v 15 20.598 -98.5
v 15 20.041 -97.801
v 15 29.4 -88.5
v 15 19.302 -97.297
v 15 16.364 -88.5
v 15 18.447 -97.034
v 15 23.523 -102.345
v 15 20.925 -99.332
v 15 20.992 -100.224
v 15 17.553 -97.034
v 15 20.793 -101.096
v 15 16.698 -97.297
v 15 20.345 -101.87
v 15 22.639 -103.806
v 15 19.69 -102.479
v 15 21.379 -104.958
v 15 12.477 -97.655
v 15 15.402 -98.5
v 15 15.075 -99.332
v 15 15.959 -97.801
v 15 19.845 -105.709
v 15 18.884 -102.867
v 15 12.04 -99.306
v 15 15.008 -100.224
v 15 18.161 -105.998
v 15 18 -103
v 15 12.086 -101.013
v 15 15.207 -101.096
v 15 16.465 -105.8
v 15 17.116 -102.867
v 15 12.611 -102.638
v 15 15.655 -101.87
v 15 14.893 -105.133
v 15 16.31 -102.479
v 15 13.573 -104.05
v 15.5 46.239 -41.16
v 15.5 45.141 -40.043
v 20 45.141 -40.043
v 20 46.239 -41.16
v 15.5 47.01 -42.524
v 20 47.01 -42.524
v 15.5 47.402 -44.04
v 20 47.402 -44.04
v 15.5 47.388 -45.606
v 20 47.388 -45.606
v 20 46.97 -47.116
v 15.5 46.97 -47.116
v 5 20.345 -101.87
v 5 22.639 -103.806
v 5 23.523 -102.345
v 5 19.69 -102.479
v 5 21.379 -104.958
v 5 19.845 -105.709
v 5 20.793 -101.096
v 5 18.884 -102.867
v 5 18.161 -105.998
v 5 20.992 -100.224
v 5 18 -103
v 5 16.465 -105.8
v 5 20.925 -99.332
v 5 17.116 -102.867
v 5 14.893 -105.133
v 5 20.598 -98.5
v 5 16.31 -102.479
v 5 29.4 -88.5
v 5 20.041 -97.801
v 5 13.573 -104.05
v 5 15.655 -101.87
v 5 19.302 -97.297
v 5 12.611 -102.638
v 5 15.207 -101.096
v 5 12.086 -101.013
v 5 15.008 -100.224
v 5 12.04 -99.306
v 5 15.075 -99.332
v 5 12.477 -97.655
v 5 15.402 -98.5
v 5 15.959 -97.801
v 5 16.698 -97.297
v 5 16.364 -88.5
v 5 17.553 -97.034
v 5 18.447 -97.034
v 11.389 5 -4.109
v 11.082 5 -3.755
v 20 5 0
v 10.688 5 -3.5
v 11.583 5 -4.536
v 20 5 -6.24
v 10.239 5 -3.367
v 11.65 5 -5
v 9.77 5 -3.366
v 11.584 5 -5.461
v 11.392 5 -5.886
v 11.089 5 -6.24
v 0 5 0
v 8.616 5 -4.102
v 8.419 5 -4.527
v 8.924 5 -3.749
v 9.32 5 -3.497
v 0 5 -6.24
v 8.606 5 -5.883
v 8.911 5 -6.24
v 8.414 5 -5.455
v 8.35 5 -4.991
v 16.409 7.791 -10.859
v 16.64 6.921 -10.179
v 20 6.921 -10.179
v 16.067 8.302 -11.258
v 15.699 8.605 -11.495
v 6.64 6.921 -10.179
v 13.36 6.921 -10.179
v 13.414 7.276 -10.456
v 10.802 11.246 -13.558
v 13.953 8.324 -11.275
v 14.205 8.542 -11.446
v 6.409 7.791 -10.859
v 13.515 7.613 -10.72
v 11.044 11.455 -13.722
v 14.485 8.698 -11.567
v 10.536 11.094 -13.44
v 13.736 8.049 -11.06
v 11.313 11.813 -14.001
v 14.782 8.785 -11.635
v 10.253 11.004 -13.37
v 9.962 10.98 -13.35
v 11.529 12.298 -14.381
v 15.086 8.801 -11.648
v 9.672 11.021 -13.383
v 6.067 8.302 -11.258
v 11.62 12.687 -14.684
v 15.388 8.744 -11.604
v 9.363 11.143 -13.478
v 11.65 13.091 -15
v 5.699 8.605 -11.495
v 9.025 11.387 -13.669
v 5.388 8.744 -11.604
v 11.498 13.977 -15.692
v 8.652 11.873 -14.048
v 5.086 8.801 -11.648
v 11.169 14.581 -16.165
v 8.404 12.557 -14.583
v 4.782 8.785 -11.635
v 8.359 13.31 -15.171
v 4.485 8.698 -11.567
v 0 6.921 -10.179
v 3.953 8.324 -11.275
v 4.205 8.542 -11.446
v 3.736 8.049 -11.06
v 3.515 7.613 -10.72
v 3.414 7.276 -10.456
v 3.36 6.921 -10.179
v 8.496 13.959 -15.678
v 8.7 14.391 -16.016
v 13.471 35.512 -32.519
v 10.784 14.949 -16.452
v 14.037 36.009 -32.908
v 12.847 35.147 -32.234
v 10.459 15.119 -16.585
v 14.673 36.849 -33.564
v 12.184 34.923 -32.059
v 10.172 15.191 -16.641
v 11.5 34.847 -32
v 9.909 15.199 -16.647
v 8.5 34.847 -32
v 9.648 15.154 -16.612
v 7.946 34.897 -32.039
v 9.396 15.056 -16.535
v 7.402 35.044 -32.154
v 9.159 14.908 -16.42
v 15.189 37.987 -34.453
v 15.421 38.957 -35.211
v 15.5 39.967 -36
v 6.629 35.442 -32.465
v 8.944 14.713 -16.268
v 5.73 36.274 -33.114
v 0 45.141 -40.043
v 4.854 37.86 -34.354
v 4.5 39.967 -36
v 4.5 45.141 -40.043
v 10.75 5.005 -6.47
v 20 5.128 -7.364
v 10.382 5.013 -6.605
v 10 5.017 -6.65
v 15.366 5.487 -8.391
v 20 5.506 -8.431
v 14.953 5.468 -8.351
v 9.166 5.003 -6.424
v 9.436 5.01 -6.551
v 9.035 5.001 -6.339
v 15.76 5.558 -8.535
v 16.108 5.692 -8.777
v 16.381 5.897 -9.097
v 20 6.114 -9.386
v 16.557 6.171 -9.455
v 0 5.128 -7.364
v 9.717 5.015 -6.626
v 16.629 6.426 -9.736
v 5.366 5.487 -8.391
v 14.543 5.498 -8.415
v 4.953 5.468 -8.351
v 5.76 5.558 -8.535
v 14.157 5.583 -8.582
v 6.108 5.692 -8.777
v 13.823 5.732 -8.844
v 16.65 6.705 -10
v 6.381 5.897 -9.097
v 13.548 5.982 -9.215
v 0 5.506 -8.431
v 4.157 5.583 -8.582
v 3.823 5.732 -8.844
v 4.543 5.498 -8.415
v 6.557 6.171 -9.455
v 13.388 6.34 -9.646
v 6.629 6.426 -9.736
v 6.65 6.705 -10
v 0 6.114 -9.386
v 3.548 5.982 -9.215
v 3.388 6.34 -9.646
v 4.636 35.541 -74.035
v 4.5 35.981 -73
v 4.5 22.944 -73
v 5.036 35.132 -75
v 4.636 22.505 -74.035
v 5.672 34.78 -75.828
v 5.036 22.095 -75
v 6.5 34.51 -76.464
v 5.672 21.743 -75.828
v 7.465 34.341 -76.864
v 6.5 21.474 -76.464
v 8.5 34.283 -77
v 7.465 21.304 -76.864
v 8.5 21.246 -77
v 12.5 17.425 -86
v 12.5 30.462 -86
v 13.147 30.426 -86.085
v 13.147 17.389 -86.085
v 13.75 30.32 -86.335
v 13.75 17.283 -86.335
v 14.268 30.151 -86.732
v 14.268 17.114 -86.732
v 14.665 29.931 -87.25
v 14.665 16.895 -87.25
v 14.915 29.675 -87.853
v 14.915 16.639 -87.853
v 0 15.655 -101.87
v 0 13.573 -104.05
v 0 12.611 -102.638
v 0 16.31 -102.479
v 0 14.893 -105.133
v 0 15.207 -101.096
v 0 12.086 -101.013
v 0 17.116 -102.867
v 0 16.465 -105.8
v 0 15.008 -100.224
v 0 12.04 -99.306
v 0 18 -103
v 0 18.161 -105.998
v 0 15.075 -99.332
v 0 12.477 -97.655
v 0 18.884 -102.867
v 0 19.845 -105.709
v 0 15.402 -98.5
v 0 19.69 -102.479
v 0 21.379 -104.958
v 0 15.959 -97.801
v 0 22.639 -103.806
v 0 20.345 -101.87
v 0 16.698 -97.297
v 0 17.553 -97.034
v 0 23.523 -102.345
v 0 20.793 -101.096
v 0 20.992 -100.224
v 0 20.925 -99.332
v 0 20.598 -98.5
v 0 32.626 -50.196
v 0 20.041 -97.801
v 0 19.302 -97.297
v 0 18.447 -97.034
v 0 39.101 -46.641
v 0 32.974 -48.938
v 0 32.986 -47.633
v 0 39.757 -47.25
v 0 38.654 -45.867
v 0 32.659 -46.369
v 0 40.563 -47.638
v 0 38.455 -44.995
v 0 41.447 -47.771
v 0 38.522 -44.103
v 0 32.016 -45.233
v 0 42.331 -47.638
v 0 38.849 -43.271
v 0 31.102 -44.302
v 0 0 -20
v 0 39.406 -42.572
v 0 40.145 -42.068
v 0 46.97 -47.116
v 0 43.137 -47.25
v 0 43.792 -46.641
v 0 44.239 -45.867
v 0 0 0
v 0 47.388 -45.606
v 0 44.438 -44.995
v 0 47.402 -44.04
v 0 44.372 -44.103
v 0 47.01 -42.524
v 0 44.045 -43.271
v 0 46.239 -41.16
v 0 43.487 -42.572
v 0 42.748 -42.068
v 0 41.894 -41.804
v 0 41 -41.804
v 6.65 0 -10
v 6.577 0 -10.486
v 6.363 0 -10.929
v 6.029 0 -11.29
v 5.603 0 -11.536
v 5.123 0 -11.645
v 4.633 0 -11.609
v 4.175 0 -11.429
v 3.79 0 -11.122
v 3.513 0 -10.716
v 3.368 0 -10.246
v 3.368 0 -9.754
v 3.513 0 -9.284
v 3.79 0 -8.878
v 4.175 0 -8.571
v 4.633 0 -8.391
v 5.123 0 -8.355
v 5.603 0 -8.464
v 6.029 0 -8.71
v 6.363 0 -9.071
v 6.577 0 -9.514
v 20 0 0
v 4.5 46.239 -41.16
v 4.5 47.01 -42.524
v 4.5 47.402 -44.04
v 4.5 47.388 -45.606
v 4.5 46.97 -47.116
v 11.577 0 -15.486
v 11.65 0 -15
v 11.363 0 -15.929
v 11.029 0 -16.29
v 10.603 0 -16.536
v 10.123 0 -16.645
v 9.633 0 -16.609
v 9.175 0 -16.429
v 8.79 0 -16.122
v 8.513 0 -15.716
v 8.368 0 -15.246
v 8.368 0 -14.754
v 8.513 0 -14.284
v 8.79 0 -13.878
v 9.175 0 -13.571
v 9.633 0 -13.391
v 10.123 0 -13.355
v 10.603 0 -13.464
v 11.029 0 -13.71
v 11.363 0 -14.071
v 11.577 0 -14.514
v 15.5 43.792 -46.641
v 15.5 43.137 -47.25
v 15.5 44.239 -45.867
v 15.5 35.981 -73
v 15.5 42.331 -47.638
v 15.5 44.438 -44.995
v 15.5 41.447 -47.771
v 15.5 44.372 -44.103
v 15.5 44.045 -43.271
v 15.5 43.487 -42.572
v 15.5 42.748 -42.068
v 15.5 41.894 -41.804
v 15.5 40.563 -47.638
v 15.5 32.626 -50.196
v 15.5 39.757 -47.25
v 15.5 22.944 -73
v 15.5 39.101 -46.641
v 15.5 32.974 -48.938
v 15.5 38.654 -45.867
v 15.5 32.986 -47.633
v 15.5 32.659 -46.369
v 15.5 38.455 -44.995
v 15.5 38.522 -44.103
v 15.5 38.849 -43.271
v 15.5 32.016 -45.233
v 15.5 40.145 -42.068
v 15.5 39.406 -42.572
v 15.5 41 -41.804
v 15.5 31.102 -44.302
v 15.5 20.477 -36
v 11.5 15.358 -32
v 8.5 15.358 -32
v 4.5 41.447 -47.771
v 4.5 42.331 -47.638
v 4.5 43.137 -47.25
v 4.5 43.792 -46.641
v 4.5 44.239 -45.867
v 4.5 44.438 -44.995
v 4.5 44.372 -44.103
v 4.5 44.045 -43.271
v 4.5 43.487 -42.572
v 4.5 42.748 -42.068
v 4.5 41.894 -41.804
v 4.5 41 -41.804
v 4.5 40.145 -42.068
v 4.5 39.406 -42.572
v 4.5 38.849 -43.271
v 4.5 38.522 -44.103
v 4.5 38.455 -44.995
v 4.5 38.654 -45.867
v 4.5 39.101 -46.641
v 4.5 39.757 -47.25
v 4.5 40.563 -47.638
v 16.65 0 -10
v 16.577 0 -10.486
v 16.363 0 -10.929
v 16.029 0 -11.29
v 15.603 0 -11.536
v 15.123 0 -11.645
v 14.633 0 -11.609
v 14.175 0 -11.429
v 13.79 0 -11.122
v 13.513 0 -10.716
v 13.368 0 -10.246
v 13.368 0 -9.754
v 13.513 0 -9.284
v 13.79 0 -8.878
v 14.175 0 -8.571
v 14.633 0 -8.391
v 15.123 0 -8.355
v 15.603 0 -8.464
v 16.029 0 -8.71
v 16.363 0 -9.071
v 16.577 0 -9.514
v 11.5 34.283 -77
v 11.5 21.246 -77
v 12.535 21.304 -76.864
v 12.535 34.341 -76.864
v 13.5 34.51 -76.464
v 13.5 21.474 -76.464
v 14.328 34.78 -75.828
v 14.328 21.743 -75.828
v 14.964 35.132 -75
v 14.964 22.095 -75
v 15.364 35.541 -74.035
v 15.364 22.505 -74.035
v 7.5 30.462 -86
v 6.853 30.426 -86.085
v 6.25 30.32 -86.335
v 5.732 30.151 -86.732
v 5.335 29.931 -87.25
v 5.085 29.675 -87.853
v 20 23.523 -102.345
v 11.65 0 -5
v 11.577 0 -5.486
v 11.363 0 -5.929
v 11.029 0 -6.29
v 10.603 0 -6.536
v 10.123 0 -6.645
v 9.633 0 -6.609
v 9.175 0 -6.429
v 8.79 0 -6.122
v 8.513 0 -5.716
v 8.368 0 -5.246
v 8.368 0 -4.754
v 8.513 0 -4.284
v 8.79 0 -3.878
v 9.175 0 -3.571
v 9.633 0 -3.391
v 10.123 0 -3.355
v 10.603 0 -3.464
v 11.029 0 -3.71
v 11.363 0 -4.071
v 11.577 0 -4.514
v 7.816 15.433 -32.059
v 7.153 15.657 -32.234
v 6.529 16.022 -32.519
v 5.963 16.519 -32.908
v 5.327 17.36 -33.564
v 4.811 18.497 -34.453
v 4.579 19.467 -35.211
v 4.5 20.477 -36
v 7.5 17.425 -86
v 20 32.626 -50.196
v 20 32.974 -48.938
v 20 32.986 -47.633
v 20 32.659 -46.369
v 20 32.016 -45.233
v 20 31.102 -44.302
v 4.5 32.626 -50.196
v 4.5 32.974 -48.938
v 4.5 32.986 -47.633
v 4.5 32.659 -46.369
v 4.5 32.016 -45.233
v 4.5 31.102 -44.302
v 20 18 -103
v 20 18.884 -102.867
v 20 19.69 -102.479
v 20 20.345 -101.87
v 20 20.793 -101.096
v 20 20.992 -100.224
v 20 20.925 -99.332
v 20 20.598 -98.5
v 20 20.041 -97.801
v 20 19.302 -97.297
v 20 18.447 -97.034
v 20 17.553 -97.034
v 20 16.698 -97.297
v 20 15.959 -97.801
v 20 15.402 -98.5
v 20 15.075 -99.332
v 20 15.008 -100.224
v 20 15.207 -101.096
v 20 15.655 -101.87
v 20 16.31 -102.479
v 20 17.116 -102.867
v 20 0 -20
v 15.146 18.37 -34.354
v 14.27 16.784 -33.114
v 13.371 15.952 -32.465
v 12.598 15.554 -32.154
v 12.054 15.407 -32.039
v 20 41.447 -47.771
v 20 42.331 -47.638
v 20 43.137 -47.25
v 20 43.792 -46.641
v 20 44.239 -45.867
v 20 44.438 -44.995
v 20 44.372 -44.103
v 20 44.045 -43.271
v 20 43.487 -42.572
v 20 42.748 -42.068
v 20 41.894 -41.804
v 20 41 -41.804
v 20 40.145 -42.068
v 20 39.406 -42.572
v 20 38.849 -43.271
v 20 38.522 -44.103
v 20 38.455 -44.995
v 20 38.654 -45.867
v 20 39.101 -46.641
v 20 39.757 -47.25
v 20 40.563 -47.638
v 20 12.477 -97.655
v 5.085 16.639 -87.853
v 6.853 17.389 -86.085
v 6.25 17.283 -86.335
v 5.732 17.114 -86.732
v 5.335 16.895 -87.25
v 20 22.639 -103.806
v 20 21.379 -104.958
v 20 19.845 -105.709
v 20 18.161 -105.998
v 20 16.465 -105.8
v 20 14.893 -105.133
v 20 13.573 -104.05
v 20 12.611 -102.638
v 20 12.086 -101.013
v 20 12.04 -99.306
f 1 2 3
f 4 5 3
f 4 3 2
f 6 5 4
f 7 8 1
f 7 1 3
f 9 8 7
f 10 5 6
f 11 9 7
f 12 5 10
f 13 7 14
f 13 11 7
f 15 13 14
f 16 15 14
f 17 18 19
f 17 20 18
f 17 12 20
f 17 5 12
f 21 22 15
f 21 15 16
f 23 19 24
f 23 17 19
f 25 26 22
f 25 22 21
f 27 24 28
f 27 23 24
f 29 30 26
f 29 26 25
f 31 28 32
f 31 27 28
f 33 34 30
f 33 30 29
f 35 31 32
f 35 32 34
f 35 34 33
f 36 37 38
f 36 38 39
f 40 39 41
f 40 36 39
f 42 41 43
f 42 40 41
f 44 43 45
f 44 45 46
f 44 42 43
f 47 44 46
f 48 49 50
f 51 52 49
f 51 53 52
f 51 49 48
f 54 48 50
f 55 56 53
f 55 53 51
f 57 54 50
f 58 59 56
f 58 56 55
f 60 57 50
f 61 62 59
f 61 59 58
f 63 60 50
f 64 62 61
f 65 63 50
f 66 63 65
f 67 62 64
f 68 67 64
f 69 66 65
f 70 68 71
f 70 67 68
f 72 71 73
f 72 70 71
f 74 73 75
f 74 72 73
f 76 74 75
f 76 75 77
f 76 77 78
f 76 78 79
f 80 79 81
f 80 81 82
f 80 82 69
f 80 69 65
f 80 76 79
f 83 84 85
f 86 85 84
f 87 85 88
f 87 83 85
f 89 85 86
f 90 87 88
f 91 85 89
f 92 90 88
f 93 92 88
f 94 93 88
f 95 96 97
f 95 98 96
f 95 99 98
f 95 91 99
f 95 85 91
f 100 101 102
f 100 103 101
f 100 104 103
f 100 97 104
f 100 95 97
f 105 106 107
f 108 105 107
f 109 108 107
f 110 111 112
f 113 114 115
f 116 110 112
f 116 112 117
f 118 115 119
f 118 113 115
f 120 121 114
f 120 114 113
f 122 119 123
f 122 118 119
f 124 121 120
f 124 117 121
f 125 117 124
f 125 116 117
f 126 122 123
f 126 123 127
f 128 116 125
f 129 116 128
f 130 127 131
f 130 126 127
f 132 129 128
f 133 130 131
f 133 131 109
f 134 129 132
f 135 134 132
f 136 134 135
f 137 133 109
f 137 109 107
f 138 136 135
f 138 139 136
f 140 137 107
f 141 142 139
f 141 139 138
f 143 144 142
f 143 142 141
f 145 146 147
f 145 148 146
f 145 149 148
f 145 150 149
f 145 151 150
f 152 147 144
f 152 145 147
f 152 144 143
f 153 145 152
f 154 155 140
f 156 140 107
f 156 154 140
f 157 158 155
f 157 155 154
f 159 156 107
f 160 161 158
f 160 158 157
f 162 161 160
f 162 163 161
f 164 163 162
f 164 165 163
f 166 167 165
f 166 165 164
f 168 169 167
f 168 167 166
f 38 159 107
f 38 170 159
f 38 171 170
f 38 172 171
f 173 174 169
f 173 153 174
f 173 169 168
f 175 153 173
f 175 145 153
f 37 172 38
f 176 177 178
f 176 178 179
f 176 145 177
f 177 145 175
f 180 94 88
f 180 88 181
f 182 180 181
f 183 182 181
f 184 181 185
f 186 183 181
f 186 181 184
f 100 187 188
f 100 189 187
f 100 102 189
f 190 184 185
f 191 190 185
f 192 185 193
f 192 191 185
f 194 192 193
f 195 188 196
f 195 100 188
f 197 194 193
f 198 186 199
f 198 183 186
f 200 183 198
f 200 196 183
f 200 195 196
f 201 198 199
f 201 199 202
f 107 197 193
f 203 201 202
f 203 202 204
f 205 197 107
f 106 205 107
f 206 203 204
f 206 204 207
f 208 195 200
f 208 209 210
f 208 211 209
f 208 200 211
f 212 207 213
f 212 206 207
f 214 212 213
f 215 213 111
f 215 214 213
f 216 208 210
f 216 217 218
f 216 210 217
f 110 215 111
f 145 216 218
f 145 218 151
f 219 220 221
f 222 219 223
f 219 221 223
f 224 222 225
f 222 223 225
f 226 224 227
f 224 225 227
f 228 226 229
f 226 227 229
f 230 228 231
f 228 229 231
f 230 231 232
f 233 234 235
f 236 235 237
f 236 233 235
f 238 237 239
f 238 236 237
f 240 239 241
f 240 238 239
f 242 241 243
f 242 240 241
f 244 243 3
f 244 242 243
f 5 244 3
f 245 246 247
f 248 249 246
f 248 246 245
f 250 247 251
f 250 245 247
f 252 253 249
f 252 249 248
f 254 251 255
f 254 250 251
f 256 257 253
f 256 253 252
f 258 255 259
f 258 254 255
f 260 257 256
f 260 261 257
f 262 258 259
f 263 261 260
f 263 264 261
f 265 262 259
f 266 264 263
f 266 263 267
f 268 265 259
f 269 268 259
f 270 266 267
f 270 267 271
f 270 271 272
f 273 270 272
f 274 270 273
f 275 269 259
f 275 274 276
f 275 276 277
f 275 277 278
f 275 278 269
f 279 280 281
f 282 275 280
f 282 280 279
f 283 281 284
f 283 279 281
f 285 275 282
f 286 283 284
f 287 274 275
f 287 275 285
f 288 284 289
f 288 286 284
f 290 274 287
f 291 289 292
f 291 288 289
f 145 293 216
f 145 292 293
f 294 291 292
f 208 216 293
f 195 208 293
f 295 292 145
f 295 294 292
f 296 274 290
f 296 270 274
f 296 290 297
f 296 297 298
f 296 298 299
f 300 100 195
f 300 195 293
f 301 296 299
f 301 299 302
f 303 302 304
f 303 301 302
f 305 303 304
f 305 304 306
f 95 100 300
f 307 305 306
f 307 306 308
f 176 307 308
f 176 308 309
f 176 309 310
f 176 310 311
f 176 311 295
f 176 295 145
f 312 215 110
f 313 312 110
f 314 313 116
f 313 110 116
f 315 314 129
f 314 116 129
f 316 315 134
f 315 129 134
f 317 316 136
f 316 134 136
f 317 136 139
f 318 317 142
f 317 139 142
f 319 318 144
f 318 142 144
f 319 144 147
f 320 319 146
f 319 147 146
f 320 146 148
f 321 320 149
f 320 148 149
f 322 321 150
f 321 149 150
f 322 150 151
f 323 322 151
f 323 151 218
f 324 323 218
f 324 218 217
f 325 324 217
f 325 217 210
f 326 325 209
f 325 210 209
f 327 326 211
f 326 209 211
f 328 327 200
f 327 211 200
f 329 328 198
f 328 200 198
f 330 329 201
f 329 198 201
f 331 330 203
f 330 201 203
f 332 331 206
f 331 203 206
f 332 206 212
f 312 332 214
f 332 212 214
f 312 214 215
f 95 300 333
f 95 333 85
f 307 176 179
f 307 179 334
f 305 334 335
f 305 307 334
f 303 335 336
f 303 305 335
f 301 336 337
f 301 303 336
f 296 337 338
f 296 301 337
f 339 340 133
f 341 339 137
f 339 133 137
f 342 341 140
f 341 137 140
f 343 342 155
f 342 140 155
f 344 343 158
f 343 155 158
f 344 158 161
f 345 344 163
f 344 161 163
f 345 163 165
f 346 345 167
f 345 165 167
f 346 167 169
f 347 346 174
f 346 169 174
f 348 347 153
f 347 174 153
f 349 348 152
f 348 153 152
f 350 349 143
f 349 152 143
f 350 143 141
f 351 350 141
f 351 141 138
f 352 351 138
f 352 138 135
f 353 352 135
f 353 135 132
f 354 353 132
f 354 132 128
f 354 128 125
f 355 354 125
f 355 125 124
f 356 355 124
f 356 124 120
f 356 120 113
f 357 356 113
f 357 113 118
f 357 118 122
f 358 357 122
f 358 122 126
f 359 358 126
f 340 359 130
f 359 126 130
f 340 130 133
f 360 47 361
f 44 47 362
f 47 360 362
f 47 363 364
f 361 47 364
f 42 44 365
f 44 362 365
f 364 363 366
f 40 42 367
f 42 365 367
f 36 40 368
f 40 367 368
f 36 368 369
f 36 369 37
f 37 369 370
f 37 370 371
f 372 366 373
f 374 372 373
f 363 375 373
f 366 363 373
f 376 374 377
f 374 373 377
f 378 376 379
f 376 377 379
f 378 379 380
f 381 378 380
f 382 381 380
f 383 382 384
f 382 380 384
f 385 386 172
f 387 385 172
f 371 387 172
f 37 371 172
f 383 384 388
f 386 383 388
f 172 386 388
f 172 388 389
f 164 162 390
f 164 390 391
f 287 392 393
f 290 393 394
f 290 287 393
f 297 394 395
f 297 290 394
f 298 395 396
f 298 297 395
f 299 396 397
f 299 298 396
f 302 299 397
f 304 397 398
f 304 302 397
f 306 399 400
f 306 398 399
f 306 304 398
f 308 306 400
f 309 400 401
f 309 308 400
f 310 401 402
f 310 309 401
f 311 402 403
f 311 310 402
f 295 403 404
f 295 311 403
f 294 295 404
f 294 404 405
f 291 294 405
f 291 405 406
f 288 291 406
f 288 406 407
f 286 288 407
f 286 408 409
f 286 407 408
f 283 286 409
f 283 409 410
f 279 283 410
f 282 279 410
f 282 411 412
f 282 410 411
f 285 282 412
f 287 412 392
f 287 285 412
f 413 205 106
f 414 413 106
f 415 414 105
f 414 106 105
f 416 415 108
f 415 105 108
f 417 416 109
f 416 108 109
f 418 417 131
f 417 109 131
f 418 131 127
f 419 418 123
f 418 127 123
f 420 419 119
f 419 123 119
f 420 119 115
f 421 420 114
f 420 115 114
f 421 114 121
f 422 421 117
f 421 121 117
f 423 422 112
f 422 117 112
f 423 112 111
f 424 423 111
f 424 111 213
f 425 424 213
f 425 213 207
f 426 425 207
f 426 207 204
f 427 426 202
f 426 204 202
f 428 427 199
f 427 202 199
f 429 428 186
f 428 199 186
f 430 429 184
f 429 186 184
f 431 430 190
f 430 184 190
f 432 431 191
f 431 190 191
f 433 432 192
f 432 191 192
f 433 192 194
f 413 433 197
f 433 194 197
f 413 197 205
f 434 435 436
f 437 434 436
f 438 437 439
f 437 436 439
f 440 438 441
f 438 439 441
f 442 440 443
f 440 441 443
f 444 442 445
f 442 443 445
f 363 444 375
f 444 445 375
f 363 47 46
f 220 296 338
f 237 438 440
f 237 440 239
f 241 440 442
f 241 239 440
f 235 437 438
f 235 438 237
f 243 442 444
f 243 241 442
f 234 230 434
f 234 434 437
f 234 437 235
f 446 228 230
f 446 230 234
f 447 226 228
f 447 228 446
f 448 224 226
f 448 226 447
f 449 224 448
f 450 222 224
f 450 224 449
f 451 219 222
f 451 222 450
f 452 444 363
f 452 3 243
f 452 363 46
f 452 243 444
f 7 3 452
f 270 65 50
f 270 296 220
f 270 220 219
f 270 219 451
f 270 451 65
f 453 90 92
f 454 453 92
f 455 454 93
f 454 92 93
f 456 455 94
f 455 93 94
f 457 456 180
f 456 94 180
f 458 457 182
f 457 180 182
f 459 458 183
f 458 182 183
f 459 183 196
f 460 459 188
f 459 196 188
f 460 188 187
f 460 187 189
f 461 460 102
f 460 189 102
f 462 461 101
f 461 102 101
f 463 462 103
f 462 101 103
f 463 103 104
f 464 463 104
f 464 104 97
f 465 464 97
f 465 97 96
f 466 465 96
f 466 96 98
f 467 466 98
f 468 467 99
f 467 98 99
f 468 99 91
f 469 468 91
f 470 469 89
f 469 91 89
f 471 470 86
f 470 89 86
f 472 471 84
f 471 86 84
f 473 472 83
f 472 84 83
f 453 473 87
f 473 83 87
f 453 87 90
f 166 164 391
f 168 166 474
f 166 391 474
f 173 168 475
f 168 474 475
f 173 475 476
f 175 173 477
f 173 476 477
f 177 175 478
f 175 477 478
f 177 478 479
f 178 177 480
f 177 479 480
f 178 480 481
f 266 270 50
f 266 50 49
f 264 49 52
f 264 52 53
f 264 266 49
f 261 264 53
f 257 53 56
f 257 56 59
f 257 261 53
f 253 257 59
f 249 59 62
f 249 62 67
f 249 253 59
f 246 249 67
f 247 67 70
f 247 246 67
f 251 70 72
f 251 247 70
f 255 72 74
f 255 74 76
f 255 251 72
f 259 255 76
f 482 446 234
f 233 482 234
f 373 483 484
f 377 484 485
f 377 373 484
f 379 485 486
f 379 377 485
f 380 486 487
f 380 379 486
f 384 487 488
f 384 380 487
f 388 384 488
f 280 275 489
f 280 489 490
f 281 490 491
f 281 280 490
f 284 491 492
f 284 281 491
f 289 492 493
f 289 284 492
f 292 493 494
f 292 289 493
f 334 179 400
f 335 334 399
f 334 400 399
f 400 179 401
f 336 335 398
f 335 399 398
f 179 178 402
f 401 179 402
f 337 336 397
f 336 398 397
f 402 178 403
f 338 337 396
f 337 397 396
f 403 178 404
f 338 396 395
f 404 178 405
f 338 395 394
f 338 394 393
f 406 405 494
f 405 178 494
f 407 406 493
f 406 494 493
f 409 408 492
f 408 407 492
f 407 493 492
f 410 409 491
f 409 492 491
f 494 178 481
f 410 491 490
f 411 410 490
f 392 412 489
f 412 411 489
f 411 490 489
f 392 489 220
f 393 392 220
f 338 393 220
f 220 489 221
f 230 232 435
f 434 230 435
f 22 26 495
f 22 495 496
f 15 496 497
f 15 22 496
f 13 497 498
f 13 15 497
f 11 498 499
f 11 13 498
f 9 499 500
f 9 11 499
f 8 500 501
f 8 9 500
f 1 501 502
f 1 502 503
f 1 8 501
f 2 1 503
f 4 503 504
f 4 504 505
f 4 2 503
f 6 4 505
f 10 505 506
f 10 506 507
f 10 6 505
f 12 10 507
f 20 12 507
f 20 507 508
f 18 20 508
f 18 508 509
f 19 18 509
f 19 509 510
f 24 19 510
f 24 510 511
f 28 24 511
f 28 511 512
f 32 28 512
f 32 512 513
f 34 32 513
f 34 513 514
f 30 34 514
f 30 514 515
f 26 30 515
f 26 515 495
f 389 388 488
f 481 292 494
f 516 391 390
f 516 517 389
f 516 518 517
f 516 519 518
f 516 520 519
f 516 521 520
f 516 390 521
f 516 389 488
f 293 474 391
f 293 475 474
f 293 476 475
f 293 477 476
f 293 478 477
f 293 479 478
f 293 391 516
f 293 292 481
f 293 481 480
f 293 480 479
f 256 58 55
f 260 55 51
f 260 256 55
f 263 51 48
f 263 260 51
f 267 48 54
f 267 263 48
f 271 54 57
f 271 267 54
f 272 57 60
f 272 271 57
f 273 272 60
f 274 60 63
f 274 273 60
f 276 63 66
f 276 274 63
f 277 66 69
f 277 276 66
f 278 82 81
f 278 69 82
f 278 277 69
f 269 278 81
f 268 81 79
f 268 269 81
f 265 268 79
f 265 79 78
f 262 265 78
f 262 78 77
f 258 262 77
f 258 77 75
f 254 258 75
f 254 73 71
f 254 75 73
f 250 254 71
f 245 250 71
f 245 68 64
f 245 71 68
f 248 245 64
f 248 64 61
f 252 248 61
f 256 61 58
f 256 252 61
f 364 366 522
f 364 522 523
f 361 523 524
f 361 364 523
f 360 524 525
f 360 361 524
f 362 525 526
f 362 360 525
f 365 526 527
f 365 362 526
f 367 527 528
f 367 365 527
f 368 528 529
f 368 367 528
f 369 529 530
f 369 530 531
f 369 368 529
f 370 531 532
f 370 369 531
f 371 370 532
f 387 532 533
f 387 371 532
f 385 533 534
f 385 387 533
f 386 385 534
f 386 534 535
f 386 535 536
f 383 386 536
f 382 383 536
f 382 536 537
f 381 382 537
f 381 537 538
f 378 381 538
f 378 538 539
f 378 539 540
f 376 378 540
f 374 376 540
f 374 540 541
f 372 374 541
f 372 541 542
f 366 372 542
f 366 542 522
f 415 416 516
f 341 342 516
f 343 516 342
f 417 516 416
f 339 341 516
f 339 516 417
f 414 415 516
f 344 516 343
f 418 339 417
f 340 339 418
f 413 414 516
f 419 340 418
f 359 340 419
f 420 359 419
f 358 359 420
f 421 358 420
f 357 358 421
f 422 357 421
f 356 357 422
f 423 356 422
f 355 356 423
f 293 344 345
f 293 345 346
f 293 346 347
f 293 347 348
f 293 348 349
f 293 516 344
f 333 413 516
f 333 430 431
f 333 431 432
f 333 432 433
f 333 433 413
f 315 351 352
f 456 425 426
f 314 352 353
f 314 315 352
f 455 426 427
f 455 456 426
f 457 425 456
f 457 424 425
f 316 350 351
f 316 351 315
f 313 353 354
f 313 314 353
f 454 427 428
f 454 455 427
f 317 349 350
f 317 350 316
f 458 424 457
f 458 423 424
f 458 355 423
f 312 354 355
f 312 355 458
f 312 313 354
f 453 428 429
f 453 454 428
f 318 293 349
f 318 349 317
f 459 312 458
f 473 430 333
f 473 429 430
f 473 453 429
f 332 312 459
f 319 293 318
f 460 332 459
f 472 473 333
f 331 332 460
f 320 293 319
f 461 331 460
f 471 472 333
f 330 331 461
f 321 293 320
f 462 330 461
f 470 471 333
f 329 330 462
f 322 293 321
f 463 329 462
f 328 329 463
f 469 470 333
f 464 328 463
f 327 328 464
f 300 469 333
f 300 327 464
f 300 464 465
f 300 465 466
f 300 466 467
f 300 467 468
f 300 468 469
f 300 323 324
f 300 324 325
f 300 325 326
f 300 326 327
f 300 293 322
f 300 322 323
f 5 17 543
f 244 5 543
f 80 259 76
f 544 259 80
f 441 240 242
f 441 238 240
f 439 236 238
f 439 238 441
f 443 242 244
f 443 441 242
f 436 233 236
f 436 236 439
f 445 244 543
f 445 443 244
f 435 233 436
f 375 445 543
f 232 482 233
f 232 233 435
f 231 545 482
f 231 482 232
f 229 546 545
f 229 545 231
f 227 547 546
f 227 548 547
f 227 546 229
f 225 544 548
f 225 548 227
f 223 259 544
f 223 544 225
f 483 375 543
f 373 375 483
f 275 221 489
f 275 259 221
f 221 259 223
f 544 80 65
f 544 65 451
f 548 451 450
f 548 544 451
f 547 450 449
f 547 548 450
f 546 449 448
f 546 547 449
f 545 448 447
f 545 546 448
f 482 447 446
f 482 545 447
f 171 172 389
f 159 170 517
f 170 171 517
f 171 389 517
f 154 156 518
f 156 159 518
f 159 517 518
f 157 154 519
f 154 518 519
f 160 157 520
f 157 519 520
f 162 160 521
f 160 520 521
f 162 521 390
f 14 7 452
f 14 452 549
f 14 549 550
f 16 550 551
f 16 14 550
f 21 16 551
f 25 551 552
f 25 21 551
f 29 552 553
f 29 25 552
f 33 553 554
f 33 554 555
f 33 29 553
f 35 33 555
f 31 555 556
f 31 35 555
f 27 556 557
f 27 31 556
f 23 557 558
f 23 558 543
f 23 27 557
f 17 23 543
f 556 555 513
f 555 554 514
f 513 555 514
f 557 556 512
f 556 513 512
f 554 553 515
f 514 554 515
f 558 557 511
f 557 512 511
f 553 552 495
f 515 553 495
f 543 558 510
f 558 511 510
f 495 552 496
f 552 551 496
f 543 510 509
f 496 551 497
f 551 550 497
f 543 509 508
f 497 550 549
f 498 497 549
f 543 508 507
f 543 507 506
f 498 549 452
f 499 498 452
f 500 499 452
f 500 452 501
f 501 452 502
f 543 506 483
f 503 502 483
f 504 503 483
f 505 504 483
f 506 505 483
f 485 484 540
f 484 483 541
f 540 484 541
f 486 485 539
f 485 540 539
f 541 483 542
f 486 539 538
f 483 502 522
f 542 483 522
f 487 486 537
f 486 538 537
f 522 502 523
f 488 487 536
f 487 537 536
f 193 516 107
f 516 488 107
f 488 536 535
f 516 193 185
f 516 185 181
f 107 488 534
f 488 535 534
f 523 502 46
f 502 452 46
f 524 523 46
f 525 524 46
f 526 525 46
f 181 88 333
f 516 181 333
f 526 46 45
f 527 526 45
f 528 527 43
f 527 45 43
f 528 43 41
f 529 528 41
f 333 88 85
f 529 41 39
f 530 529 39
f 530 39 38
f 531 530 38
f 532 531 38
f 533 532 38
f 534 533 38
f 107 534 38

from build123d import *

# Parameters (mm, degrees)
ESBO_O1_R                               = 3
RESSALTO_EXTRUS_O1_DEPTH                = 20
BROCA_DE_ROSQUEAR_PARA_TARRAXA_DE_M42_D = 3.3
CORTE_EXTRUS_O1_DEPTH                   = 50
CORTE_EXTRUS_O2_DEPTH                   = 50


with BuildPart() as part:
    # Esboço1 → Ressalto-extrusão1 (new body)
    with BuildSketch(Plane(origin=(0, 0, 0), x_dir=(0, 0, -1), z_dir=(1, 0, 0))):
        with BuildLine():
            Line((0, 0), (0, 5))
            Line((0, 5), (6.239506285, 5))
            ThreePointArc((6.239506285, 5), (8.431241444, 5.505970962), (10.179394863, 6.921481202))
            Line((10.179394863, 6.921481202), (40.043100593, 45.14105393))
            ThreePointArc((40.043100593, 45.14105393), (43.268998574, 47.25579782), (47.115650024, 46.969734684))
            Line((47.115650024, 46.969734684), (102.344683137, 23.522903311))
            ThreePointArc((102.344683137, 23.522903311), (105.522903311, 15.655316863), (97.655316863, 12.477096689))
            Line((97.655316863, 12.477096689), (50.195717148, 32.625507204))
            ThreePointArc((50.195717148, 32.625507204), (46.990174273, 32.86389315), (44.301925956, 31.101606576))
            Line((44.301925956, 31.101606576), (20, 0))
            Line((20, 0), (0, 0))
        make_face()
        with Locations((44.770966887, 41.446831372)):
            Circle(ESBO_O1_R, mode=Mode.SUBTRACT)
        with Locations((100, 18)):
            Circle(ESBO_O1_R, mode=Mode.SUBTRACT)
    extrude(amount=RESSALTO_EXTRUS_O1_DEPTH)

    # Broca de rosquear para tarraxa de M42 (through all)
    with Locations(Plane(origin=(0, 0, 0), x_dir=(-1, 0, 0), z_dir=(0, -1, 0))):
        with Locations((-10, 15), (-10, 5), (-5, 10), (-15, 10)):
            Hole(BROCA_DE_ROSQUEAR_PARA_TARRAXA_DE_M42_D / 2)

    # Esboço10 → Corte-extrusão1 (cut)
    with BuildSketch(Plane(origin=(0, 0, 0), x_dir=(1, 0, 0), z_dir=(0, 1, 0))):
        with BuildLine():
            Line((4.5, 36), (4.5, 73))
            ThreePointArc((4.5, 73), (5.671572875, 75.828427125), (8.5, 77))
            Line((8.5, 77), (11.5, 77))
            ThreePointArc((11.5, 77), (14.328427125, 75.828427125), (15.5, 73))
            Line((15.5, 73), (15.5, 36))
            ThreePointArc((15.5, 36), (14.328427125, 33.171572875), (11.5, 32))
            Line((11.5, 32), (8.5, 32))
            ThreePointArc((8.5, 32), (5.671572875, 33.171572875), (4.5, 36))
        make_face()
    extrude(amount=CORTE_EXTRUS_O1_DEPTH, mode=Mode.SUBTRACT)

    # Esboço11 → Corte-extrusão2 (cut)
    with BuildSketch(Plane(origin=(0, 0, 0), x_dir=(1, 0, 0), z_dir=(0, 1, 0))):
        with BuildLine():
            Line((5, 106), (5, 88.5))
            ThreePointArc((5, 88.5), (5.732233047, 86.732233047), (7.5, 86))
            Line((7.5, 86), (12.5, 86))
            ThreePointArc((12.5, 86), (14.267766953, 86.732233047), (15, 88.5))
            Line((15, 88.5), (15, 106))
            Line((15, 106), (5, 106))
        make_face()
    extrude(amount=CORTE_EXTRUS_O2_DEPTH, mode=Mode.SUBTRACT)


solid = part.part
